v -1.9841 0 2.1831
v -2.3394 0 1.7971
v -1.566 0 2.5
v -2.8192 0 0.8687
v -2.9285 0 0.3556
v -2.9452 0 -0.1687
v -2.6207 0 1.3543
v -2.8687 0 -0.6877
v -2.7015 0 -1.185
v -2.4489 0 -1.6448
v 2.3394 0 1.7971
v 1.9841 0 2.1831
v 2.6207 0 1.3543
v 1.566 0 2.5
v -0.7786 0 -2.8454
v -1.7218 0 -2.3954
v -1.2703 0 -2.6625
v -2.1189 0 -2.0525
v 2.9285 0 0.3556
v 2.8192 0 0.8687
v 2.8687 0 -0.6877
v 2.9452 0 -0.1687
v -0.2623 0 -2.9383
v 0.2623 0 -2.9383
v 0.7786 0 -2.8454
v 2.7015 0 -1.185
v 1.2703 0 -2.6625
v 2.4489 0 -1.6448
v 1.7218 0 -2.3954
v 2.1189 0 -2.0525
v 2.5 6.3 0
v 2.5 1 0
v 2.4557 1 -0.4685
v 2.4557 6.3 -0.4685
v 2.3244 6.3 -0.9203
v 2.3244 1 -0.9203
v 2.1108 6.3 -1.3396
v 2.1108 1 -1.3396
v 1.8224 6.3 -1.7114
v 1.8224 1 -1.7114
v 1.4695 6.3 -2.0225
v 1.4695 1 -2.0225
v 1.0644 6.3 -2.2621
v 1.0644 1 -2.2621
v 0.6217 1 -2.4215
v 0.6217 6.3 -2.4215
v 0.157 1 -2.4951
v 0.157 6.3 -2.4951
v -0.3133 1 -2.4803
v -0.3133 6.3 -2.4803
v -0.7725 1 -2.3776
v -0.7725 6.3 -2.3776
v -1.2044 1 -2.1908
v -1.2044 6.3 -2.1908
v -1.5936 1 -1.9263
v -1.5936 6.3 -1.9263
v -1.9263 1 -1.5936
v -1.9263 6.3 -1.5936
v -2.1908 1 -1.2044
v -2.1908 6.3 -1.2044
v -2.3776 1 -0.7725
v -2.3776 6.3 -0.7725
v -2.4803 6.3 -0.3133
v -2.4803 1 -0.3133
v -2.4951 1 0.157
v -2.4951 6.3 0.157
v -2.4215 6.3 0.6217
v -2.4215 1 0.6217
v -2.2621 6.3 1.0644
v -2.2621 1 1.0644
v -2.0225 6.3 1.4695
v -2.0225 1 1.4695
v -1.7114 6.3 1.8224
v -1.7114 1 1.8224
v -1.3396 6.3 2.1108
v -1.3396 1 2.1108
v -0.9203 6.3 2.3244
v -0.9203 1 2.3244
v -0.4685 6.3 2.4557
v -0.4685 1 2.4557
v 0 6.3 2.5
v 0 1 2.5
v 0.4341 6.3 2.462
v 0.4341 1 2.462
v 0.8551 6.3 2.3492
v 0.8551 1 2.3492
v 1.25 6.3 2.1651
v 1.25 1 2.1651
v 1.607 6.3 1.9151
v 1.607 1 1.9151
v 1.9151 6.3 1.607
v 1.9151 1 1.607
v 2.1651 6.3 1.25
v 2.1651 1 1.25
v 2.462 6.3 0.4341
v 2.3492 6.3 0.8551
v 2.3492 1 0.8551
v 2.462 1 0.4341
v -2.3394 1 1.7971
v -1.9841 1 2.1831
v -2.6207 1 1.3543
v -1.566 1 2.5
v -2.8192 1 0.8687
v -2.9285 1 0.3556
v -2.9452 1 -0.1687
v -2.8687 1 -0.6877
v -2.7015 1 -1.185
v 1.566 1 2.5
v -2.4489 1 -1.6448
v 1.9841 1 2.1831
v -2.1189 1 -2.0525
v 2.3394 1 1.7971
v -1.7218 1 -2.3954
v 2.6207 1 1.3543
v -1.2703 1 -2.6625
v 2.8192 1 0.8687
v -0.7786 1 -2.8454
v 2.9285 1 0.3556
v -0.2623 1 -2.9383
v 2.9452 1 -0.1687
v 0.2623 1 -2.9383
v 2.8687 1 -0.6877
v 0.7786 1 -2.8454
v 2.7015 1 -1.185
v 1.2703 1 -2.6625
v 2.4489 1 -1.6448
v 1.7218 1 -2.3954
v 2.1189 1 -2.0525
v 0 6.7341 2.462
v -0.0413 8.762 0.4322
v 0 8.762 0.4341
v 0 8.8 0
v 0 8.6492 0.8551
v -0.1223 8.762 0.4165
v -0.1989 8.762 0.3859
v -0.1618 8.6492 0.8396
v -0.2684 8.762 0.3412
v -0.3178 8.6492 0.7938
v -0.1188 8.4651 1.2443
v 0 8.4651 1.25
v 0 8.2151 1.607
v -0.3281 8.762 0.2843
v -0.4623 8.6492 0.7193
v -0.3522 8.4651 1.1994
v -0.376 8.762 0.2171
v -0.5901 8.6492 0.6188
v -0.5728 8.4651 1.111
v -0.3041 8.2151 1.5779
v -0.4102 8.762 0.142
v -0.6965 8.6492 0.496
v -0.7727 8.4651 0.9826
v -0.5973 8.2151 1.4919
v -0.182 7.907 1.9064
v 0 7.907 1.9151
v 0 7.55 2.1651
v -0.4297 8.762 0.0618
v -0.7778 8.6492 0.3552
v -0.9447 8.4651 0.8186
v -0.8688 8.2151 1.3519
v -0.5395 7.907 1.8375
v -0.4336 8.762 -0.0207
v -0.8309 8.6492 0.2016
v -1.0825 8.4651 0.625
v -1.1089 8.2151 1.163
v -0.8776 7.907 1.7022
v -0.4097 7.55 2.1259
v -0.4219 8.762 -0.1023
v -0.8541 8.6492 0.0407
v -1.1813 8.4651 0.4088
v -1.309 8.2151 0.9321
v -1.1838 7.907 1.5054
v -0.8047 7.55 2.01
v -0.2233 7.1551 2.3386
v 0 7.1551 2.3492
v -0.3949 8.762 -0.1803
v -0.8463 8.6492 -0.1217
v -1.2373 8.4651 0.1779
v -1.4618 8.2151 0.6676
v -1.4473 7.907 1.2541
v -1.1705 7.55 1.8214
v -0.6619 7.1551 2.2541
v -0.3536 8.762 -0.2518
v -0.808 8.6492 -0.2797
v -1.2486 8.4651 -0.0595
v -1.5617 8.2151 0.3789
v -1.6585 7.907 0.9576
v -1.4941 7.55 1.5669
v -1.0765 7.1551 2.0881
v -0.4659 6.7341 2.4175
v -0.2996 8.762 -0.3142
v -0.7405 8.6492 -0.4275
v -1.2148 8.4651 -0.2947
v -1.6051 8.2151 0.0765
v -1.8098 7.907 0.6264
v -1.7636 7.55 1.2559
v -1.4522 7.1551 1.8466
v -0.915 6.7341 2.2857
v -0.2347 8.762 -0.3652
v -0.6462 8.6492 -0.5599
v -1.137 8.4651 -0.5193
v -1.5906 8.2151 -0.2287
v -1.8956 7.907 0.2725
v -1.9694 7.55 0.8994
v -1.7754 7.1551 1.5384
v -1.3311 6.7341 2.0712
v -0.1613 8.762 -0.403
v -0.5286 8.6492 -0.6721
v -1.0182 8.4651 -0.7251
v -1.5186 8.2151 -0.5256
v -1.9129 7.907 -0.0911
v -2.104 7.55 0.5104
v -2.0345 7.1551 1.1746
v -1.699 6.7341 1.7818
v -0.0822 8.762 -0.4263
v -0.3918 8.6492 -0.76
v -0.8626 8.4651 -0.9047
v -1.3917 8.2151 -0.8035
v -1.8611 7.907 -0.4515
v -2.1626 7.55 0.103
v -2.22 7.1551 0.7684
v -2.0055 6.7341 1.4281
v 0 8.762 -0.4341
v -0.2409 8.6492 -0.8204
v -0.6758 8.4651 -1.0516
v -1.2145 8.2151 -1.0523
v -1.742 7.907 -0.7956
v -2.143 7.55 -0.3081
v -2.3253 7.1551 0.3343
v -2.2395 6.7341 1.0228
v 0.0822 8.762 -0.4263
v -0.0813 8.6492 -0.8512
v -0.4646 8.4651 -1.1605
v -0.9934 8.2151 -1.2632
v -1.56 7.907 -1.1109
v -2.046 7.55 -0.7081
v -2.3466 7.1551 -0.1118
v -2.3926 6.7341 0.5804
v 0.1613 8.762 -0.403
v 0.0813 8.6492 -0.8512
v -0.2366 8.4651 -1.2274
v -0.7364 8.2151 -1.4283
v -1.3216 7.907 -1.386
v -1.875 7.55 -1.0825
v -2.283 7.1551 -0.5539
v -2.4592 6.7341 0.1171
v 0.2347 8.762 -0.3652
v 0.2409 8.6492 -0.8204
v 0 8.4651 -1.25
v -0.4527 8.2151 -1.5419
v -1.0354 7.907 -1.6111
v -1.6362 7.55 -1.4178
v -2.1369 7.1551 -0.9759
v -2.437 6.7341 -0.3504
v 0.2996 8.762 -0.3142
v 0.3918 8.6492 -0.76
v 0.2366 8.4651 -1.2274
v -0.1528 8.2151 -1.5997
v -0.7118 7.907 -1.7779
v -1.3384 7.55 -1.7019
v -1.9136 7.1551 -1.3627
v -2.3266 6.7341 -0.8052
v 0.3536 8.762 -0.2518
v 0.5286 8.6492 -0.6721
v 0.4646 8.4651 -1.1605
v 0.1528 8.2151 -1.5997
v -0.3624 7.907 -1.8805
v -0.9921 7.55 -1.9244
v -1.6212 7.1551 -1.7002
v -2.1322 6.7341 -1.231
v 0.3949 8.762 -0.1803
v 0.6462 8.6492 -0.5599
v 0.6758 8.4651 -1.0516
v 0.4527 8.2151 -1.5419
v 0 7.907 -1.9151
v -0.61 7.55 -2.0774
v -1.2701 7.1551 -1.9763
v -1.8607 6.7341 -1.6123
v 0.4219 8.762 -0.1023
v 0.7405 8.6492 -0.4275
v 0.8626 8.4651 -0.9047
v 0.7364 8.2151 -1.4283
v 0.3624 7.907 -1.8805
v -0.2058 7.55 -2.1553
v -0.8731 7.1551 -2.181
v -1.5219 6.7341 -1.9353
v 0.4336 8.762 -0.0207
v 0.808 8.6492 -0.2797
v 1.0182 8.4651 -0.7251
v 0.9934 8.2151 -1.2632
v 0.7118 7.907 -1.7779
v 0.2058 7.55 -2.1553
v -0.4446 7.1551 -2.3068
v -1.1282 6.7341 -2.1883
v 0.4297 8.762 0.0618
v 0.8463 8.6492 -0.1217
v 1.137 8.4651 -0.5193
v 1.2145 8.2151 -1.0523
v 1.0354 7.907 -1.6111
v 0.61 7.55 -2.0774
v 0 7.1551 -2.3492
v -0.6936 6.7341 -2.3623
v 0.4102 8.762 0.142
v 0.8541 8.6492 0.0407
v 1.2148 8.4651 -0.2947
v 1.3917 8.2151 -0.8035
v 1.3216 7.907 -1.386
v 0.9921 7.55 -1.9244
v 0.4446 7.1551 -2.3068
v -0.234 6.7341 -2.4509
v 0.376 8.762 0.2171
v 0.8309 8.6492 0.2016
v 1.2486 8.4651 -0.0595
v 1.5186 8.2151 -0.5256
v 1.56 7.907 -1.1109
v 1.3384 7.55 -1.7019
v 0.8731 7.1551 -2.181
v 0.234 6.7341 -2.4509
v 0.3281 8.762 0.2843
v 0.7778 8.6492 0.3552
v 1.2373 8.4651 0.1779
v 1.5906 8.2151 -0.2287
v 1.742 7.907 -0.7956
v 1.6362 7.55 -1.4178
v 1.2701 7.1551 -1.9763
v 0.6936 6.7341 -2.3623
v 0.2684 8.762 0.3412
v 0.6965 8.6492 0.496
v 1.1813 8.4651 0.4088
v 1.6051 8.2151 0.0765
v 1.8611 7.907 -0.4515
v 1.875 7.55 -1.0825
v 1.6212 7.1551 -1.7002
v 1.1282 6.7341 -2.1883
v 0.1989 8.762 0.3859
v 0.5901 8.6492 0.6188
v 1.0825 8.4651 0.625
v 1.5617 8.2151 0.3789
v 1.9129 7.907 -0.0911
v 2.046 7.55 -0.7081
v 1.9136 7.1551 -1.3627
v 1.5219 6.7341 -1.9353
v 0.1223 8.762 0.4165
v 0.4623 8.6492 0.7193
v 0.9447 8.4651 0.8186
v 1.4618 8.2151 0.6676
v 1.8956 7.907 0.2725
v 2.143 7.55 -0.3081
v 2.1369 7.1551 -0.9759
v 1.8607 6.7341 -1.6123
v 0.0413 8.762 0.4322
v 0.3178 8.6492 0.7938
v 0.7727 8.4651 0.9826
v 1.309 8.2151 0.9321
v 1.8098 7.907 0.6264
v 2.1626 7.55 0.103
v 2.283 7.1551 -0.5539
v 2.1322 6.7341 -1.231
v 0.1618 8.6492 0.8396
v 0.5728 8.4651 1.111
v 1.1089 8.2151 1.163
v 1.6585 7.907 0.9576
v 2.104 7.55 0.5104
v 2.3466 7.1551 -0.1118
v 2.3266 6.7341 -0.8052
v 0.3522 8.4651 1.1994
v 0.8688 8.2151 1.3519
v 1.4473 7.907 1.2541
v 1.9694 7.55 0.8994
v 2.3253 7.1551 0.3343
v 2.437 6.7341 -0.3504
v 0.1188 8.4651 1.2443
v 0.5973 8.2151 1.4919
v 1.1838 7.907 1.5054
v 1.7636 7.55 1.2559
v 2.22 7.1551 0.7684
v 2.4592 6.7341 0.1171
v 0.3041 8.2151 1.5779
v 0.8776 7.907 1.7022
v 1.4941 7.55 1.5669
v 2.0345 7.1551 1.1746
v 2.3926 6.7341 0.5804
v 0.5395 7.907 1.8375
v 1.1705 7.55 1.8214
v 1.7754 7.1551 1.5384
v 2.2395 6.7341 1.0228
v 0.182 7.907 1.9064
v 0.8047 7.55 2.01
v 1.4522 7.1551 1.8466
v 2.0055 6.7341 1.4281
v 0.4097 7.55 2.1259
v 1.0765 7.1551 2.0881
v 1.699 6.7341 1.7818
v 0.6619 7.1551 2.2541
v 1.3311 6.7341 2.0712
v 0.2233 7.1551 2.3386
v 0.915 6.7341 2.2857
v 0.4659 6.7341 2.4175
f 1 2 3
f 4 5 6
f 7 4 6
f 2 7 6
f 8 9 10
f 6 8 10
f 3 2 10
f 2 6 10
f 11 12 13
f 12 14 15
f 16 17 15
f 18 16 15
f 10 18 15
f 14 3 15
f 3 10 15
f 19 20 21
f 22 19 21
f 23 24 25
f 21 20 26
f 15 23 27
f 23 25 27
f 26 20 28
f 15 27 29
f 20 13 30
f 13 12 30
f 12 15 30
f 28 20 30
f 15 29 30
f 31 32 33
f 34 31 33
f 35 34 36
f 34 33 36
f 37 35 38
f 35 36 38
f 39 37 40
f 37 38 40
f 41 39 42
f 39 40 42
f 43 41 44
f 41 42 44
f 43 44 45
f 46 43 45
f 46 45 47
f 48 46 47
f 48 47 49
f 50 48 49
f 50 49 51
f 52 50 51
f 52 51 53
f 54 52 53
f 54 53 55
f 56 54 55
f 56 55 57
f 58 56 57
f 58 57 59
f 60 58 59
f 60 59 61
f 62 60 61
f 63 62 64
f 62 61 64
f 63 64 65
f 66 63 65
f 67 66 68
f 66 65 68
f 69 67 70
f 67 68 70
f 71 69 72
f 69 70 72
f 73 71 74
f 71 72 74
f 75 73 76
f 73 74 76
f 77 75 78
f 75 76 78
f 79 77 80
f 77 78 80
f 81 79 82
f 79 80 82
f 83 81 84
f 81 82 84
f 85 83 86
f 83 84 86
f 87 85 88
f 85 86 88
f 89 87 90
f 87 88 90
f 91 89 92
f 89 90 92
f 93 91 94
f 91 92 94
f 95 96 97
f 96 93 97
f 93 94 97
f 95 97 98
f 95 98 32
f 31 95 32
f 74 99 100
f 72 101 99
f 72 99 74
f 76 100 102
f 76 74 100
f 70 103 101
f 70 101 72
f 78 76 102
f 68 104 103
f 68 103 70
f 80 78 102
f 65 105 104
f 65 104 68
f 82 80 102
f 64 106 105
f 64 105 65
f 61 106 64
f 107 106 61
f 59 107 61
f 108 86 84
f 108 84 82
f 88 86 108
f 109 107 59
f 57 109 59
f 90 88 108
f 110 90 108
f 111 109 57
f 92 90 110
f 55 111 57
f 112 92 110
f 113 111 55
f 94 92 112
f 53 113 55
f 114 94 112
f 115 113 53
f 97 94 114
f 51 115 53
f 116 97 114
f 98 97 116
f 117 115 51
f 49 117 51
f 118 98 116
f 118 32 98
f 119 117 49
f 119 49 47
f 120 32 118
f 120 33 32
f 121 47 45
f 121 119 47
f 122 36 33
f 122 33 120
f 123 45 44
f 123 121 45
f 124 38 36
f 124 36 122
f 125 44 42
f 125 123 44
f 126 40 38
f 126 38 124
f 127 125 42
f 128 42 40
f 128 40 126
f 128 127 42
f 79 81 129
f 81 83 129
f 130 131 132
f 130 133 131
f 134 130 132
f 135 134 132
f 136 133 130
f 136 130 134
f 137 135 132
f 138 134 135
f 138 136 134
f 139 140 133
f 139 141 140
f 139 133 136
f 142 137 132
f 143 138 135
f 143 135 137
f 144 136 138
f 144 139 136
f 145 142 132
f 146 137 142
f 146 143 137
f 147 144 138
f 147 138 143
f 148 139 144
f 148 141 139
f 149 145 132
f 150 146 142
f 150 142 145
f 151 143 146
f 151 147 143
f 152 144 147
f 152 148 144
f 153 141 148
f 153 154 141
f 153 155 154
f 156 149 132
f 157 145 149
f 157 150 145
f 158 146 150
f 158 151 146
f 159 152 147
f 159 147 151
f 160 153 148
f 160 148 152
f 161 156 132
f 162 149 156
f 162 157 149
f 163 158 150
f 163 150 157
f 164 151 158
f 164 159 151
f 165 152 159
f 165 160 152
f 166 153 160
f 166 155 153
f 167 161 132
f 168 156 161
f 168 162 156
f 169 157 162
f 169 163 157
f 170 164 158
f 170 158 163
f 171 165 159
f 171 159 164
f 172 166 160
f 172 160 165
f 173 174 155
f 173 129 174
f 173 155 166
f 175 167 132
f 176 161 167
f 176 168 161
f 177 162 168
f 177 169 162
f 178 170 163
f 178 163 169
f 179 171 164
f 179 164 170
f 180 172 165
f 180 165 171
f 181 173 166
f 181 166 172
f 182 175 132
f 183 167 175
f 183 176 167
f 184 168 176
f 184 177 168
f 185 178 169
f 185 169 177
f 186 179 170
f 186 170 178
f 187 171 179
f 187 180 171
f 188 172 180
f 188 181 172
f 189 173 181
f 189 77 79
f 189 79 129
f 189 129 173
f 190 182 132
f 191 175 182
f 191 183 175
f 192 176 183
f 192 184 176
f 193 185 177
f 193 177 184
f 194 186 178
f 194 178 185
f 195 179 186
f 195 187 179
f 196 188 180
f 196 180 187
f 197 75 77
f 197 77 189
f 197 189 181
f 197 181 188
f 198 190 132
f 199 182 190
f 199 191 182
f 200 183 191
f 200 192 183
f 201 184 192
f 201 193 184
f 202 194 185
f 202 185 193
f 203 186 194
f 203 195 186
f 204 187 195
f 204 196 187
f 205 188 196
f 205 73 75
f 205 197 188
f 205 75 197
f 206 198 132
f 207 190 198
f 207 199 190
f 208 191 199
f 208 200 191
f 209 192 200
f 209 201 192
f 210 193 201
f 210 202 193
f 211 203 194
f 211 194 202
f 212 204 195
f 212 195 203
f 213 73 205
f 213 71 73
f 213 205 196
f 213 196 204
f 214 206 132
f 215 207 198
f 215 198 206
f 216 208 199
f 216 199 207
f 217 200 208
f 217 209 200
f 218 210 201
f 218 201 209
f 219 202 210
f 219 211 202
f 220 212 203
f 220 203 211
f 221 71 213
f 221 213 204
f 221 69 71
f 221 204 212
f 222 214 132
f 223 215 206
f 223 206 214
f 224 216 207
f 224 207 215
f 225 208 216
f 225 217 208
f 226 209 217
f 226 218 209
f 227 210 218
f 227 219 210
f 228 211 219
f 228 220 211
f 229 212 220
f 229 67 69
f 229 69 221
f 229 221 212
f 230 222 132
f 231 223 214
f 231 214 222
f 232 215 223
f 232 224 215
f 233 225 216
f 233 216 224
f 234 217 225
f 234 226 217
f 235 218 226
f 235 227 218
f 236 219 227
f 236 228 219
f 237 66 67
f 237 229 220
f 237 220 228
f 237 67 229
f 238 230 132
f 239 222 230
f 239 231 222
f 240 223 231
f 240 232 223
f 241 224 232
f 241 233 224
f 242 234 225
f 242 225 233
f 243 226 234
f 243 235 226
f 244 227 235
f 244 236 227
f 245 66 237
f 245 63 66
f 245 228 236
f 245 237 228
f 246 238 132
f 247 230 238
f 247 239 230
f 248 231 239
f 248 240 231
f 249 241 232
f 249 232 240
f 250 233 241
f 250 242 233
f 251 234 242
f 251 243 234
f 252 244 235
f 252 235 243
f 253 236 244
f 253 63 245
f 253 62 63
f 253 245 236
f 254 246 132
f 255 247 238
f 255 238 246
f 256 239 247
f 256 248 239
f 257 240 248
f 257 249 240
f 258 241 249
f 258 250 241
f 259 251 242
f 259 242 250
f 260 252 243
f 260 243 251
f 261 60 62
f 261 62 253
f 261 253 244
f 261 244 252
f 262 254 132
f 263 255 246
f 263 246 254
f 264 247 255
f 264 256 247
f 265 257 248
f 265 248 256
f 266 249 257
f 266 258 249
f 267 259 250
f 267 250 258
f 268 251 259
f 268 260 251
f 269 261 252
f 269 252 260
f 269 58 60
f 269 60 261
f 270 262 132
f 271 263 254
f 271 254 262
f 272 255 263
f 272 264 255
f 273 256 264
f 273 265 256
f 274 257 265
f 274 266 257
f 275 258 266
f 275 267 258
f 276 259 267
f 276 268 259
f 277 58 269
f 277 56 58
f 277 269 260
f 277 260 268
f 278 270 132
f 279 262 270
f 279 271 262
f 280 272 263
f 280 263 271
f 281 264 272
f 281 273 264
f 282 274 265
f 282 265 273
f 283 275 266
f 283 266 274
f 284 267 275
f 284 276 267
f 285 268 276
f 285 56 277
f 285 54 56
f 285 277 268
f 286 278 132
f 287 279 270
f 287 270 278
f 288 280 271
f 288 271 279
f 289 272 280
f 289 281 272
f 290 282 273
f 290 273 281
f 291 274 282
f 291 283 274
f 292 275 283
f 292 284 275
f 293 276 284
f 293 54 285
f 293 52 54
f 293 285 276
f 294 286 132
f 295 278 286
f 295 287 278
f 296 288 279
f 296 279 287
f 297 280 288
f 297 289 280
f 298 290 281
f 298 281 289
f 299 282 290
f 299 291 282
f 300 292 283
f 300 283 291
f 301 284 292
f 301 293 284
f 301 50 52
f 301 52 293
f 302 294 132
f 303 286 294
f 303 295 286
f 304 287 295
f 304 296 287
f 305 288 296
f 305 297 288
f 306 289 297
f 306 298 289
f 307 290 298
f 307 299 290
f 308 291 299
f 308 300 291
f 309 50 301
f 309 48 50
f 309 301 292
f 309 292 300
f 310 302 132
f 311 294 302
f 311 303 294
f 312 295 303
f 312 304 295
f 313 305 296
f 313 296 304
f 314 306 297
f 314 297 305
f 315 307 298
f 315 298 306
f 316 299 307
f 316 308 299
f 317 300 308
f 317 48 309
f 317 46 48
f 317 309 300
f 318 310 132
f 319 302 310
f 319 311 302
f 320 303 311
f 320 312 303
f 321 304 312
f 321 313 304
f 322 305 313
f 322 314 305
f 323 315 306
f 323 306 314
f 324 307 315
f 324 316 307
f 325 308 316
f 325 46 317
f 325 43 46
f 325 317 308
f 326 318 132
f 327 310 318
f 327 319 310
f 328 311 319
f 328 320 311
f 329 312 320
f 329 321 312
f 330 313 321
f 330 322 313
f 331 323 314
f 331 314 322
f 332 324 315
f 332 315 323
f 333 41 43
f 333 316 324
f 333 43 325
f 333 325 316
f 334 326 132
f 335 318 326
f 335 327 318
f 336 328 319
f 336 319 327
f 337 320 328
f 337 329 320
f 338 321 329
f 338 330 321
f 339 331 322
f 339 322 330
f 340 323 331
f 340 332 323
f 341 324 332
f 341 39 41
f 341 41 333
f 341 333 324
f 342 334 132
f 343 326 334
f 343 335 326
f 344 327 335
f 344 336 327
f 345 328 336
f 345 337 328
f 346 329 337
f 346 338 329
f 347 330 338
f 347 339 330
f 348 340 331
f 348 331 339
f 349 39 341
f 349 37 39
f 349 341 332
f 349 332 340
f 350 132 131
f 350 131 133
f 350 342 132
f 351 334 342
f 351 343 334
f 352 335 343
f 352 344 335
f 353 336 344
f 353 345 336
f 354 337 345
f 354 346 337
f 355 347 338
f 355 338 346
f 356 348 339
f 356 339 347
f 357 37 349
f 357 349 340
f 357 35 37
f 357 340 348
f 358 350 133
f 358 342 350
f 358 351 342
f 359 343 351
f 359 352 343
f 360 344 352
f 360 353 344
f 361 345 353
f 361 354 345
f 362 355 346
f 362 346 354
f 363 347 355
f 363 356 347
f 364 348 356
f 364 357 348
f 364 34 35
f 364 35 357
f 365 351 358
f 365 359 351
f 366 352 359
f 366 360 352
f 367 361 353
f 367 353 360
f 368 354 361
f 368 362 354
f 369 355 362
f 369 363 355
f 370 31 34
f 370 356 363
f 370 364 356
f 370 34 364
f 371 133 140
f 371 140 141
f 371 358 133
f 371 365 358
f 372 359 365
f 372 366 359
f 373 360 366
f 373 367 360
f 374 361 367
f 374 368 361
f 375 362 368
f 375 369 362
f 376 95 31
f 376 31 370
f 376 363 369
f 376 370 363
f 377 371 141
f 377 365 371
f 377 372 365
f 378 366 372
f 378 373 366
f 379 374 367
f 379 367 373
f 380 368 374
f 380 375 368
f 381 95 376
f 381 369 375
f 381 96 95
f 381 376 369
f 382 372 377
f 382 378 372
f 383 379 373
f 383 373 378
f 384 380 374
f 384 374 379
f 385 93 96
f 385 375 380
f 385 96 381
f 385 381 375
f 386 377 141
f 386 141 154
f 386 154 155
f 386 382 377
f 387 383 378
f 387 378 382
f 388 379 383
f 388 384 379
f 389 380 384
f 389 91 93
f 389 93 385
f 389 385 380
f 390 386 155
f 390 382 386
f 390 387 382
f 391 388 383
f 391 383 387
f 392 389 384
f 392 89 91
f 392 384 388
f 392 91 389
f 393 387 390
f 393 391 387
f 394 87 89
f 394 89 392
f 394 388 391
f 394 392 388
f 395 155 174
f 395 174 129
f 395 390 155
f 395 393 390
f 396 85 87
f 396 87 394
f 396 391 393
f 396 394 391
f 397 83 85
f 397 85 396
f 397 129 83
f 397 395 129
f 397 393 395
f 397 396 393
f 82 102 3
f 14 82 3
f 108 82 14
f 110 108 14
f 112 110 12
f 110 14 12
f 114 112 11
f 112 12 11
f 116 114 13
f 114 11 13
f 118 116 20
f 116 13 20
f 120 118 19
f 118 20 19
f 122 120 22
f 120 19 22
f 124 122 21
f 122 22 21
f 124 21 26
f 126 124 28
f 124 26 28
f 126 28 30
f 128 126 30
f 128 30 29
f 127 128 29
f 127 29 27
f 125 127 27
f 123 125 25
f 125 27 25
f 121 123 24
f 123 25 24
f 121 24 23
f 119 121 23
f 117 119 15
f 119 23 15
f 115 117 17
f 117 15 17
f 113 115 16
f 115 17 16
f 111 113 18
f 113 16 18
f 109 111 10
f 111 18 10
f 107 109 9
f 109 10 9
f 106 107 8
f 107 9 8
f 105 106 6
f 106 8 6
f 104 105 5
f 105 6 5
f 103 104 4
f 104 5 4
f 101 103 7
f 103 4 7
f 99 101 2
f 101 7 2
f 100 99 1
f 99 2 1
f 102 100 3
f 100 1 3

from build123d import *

# Parameters (mm, degrees)
SKETCH1_R               = 2.95
BOSS_EXTRUDE4_DEPTH     = 1
SKETCH2_R               = 2.5
BOSS_EXTRUDE5_DEPTH     = 7.8
SKETCH4_W               = 16.58699552
SKETCH4_H               = 3.788232685
CUT_EXTRUDE2_DEPTH      = 8.8
CUT_EXTRUDE2_DEPTH_BACK = 2


with BuildPart() as part:
    # Sketch1 → Boss-Extrude4 (new body)
    with BuildSketch(Plane(origin=(0, 0, 0), x_dir=(1, 0, 0), z_dir=(0, 1, 0))):
        Circle(SKETCH1_R)
    extrude(amount=BOSS_EXTRUDE4_DEPTH)

    # Sketch2 → Boss-Extrude5 (add)
    with BuildSketch(Plane(origin=(0, 1, 0), x_dir=(1, 0, 0), z_dir=(0, 1, 0))):
        Circle(SKETCH2_R)
    extrude(amount=BOSS_EXTRUDE5_DEPTH)

    # Sketch3 → Cut-Revolve5 (revolve, cut)
    with BuildSketch(Plane(origin=(0, 0, 0), x_dir=(0, 0, -1), z_dir=(1, 0, 0))):
        with BuildLine():
            ThreePointArc((0, 8.8), (-1.767766953, 8.067766953), (-2.5, 6.3))
            Line((-2.5, 6.3), (-2.5, 1))
            Line((-2.5, 1), (-5.449902287, 1))
            Line((-5.449902287, 1), (-5.449902287, 10.727798838))
            Line((-5.449902287, 10.727798838), (0, 10.727798838))
            Line((0, 10.727798838), (0, 8.8))
        make_face()
    revolve(axis=Axis((0, 11.133122405, 0), (0, -1, 0)), mode=Mode.SUBTRACT)

    # Sketch4 → Cut-Extrude2 (cut, two sides)
    with BuildSketch(Plane(origin=(0, 1, 0), x_dir=(1, 0, 0), z_dir=(0, 1, 0))) as cut_extrude2_sk:
        with Locations((1.563846093, -4.394116343)):
            Rectangle(SKETCH4_W, SKETCH4_H)
    extrude(amount=CUT_EXTRUDE2_DEPTH, mode=Mode.SUBTRACT)
    extrude(cut_extrude2_sk.sketch, amount=-CUT_EXTRUDE2_DEPTH_BACK, mode=Mode.SUBTRACT)


solid = part.part
